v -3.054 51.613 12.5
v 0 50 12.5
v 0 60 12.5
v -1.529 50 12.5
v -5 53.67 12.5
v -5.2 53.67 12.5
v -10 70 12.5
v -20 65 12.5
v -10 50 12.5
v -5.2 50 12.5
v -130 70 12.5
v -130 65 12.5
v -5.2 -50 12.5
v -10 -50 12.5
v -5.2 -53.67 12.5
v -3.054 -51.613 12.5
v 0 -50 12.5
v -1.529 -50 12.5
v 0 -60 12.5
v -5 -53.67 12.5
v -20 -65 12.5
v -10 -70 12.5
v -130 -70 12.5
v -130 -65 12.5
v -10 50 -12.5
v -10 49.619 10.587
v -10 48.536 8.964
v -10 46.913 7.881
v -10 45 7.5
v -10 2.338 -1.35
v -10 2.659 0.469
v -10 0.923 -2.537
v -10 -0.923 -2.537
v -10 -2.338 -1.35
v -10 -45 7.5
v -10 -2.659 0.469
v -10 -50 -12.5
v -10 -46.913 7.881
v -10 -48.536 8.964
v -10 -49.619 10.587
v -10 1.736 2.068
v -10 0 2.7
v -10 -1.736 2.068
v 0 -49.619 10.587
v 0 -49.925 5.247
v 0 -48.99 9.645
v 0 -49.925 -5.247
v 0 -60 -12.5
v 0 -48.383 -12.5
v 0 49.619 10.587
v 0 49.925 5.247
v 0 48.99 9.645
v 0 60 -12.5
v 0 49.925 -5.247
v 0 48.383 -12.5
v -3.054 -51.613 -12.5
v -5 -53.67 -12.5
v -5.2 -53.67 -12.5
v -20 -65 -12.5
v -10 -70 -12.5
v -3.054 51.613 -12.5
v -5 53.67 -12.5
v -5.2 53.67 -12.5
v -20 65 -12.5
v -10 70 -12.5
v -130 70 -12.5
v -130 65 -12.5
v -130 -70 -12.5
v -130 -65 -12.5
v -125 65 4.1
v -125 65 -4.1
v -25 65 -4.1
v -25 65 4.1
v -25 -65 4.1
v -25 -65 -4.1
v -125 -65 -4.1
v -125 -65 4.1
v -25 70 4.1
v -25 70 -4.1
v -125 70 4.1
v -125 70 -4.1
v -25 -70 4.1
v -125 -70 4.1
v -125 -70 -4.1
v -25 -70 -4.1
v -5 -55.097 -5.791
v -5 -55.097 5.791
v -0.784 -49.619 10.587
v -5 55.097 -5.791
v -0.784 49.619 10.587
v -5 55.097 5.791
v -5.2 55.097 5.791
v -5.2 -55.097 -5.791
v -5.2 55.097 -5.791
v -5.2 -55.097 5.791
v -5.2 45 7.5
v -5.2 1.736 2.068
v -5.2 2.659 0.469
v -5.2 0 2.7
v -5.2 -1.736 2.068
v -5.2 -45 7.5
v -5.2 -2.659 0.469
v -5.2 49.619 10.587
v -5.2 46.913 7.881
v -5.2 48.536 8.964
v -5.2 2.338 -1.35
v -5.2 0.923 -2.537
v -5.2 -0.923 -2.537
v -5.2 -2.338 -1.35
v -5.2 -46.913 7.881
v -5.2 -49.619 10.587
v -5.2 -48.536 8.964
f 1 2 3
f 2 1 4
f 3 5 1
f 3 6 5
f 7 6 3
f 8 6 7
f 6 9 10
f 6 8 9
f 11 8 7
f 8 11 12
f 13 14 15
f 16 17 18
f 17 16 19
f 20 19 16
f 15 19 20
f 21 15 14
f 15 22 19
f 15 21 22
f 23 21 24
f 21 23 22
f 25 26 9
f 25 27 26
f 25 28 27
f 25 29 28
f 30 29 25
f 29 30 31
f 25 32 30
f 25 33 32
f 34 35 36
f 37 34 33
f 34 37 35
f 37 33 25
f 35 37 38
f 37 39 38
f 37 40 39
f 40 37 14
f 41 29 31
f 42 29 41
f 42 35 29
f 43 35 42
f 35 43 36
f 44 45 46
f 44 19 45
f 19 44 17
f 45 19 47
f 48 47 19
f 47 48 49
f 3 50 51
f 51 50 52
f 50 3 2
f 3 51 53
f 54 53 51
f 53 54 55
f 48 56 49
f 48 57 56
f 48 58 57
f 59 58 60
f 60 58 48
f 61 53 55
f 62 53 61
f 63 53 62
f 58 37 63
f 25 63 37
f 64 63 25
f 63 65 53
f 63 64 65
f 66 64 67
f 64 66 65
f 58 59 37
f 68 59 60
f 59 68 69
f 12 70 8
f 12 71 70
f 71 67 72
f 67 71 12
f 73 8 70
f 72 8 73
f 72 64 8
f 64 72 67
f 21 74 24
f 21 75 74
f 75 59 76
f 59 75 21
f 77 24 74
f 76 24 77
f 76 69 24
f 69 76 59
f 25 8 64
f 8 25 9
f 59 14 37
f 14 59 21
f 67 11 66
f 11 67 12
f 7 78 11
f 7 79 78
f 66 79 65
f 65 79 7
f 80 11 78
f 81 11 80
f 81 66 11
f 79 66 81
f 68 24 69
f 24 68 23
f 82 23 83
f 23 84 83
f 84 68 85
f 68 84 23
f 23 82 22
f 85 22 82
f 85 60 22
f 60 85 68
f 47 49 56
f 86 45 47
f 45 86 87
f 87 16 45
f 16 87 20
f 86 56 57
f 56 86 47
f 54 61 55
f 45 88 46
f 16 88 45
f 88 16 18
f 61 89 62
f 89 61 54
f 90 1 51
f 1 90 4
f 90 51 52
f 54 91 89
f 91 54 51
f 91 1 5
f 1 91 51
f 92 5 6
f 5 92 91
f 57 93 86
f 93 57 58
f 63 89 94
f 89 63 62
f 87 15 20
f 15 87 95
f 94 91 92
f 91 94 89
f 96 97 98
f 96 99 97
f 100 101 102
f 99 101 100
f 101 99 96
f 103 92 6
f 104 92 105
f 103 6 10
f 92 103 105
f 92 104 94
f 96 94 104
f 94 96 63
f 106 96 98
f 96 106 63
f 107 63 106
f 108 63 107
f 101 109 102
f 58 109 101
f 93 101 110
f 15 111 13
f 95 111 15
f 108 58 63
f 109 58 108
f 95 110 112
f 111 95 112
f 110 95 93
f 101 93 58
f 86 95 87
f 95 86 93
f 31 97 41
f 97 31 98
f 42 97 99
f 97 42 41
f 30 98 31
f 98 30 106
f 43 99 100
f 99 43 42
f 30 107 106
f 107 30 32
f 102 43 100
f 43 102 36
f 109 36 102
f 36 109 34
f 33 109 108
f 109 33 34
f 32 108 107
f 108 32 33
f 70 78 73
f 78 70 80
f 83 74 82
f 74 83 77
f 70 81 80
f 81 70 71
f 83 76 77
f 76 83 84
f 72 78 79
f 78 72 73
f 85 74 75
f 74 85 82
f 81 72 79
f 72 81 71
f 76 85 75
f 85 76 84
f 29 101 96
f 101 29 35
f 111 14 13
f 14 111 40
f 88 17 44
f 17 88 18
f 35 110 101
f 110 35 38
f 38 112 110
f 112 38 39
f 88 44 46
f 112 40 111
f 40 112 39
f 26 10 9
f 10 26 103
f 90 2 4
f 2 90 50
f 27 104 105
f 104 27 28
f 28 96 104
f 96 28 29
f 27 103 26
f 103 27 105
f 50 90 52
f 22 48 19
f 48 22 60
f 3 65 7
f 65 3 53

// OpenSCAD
// file: config_4x5.scad
/*
This is the base configuration file for the 4x5" format
# we are not using the exact ANSI measures, but slightly rounded measures for slight simplification
*/
vStabilizerTotal_h = 7;

// general tolerance
vTolerance = 0.2;

// sheet film and cassette measurements (roughly based on the ANSI measurements)
vFilmSheet_l = 127;
vFilmSheet_w = 102;
vCassette_l = 160; // A min
vCassette_w = 121; // B max
vCassette_h = 13.2; // C max
vLightTrap_l = 2; // M2
vLightTrap_w = vCassette_w;
vLightTrap_h = 1.5; // M1
vLightTrap_offsetX = 141; // G max
vFilmWindow_l = 121;
vFilmWindow_w = 101;
vFilmWindow_offsetX = 16;
vGroundGlass_offsetZ = 5;

// Graflok
vGraflok_h = 6; // this is not the official measurement, just measured from a camera 

// lens board measures (we are using Wista/Technika-style lensboards)
vLensboard_l = 100;
vLensboard_w = 97;
vLensboard_h = 2;
vLensboard_offsetX = -(vLensboard_l+3)/2; // caution: we have an asymetric offset!
vLensboard_offsetY = -vLensboard_w/2;
vLensboardHole_d = 85;
vLensboardLighttrap_d = 89;
vLensboardLighttrap_h = 1+vTolerance;

// bellows frame measures - the bellows frame design is derived from standardcameras.com
// back frame
vBellowsBackInner_l = 144; //???? check and replace with the measurement from your bellows!
vBellowsBackInner_w = vBellowsBackInner_l;
vBellowsBackOuter_l = vBellowsBackInner_l+1;
vBellowsBackOuter_w = vBellowsBackOuter_l;

vBellowsBackFrameOuter_l = 159;
vBellowsBackFrameOuter_w = vBellowsBackFrameOuter_l;
vBellowsBackFrameOuter_h = 7;
vBellowsBackFrameInner_l = 135;
vBellowsBackFrameInner_w = vBellowsBackFrameInner_l;
vBellowsBackFrameInner_h = 5;

vBellowsBackLightTrapOuter_l = vBellowsBackFrameInner_l+2*2;
vBellowsBackLightTrapOuter_w = vBellowsBackLightTrapOuter_l;
vBellowsBackLightTrap_h = 3;

//vBellowsBackFrameScrewHole_d = 2;
//vBellowsBackFrameScrewHole_h = 10;
vBellowsBackFrameScrewHole_offsetXY = 70;
vBellowsBackFrameScrewHole_offsetZ = vBellowsBackFrameOuter_h/2;

// front frame
vBellowsFrontInner_l = 94; //???? check and replace with the measurement from your bellows!
vBellowsFrontInner_w = vBellowsFrontInner_l;
vBellowsFrontOuter_l = vBellowsFrontInner_l+1;
vBellowsFrontOuter_w = vBellowsFrontOuter_l;

vBellowsFrontFrameOuter_l = 104;
vBellowsFrontFrameOuter_w = vBellowsFrontFrameOuter_l;
vBellowsFrontFrameOuter_h = 7;
vBellowsFrontFrameInner_l = 82;
vBellowsFrontFrameInner_w = vBellowsFrontFrameInner_l;
vBellowsFrontFrameInner_h = 5;

vBellowsFrontLightTrapOuter_l = vBellowsFrontFrameInner_l+2*2;
vBellowsFrontLightTrapOuter_w = vBellowsFrontLightTrapOuter_l;
vBellowsFrontLightTrap_h = 0;

//vBellowsFrontFrameScrewHole_d = 2;
//vBellowsFrontFrameScrewHole_h = 10;
vBellowsFrontFrameScrewHole_offsetXY = 40;
vBellowsFrontFrameScrewHole_offsetZ = vBellowsFrontFrameOuter_h/2;

// body dimensions
vWall_strength = 5;
vBodyOuter_l = 185; // make sure this is at least 4*vWall_strength larger than vBellowsBackFrameOuter_l!
vBodyOuter_w = 170; // make sure this is at least 2*vWall_strength larger than vBellowsBackFrameOuter_l!
vBodyOuter_h = 65;
vBodyEdge_r = vWall_strength;

// we will center our model on the Y axis and on the center of the bellows frame
// at least for the 4x5 version, we have to do an asymetric offset of 2.5mm on the X-axis 
vAsymOffsetX = -2.5;  

// back plate
vBackPlateLength = 160; // we will probably use about the same size as the bellows back frame
vBackPlateStrength = vWall_strength;

// hinges for front lid
vHingeInnerDistance = 100;
vHingeBaseWidth = 20;
vHingeHole = 4;

// lid lock measures
vLidLockBase_d = 8;
vLidLockHole_distance = 70;

// rail dimensions
vLowerRail_w = 90;
vUpperRail_w = vLowerRail_w;

// cutout for stop indents
vStopIndent_l = 4;
vStopIndent_h = 5;
vStopIndentDistance = 25; // shorter than 25 is not necessary
vStopIndent_offsetX = 20; // don't go shorter than 20 if you intend to use a 90mm lens!

// for all dovetails we use a base width of 5mm and a base height of 5mm
// we are applying tolerances to the inner AND outer part of a dovetail, in width and height
vDoveTail_w = 5;
vDoveTail_h = 5;
vDoveTail_tolerance = 0.2;

// front standard carrier / slider
// width is depending on vUpperRail_w
vSliderBase_w = vUpperRail_w + (4*vDoveTail_w);
vSliderBase_l = 40; // make sure to have enough space in the body.


// lever plate 
vLeverPlateBase_w = vUpperRail_w - (8*vDoveTail_w);
vLeverPlateBlock_w = 25;
vLeverPlateBlock_l = vSliderBase_l-(2*vDoveTail_w);

vFrontStandard_h = 130;
vFrontStandardSlot_h = vFrontStandard_h - 30;

// lensboard carrier
vFrontPlate_length = vSliderBase_w+6; // vSliderBase_w is a bit too tight for 4x5", so there we will add 5mm, for 5x7 vSliderBase_w is OK to get a squared lensboard carrier
vFrontPlate_width = vSliderBase_w; //vFrontPlate_length;
vFrontPlate_height = 16;
vEdgeCutCylinder = floor(sqrt(2*pow(vFrontPlate_width,2)))-5;

vTiltDovetailBase_d1 = 30;
vTiltDovetailBase_d2 = vTiltDovetailBase_d1+(2*vDoveTail_w);
vTiltDovetailBaseBlock_d = vTiltDovetailBase_d1+(4*vDoveTail_w);

vTiltDovetail_d1 = vTiltDovetailBase_d1-vTolerance;
vTiltDovetail_d2 = vTiltDovetailBase_d2-vTolerance;
vTiltDovetail_h = vDoveTail_w-vTolerance;

vTiltDovetailCutout_d1 = vTiltDovetailBase_d2+vTolerance;
vTiltDovetailCutout_d2 = vTiltDovetailBase_d1+vTolerance;

vAxisHole_d = 10+vTolerance;
vAxisHole_h = vDoveTail_w+vTolerance;

vTiltLockBolt_d = 12;
vTiltLockBolt_h = 14;
//vTiltLockBoltHole_d = 8;
//vTiltLockBoltHole_h = vTiltLockBolt_h;

vTiltHeight = 50;
vTiltRadius = vFrontPlate_length/2;
vTiltAngleMinus = -7;
vTiltAnglePlus = 7;
vTiltAxis_d = 10-vTolerance;

// focusing rod
vFocusingRod_d = 6;
vFocusingKnob_d = 25;
vFocusingKnob_h = 20;

// stabilizer measures (just the outer measures of our stabilizer block, not the tripod slider)
vStabilizerBase_l = 135;
vStabilizerBase_w = 90;  
vStabilizerBase_h = 7;
vStabilizerDovetailBase_w = 50;
// screw holes for the stabilizer
vLidHoleCount_x = 4;
vLidHoleDist_x = 35;
vLidHoleCount_y = 2;
vLidHoleDist_y = 60;


// screw diameters, length is individually set
vScrew1Hole_d = 3;
vScrew1ThreadHole_d = 2.2;
vScrew2Hole_d = 2;
vScrew2ThreadHole_d = 1.4;


// Dimensions for small heat set insert holes.
// Sized for M2 inserts, 3 mm depth, 3.5 mm max OD
// (may be labelled M2x3.5x3)
vInsertM2Hole_d = 3.2;
vInsertM2MinDepth_h = 4.0;
vInsertM2Size_d = 3.5;
vInsertM2Depth_h = 3.0;

// Dimensions for heat set insert holes.
// Sized for "Voron standard" M3 inserts, 4 mm depth, 5 mm max OD
// (variously labelled M3x4x5 or M3x5x4)
vInsertM3Hole_d = 4.7;
vInsertM3MinDepth_h = 5.0;
vInsertM3Size_d = 5.0;
vInsertM3Depth_h = 4.0;

// Dimensions for large heat set insert holes.
// Sized for M5 inserts, 5 mm depth, 7 mm max OD
// (may be labelled M5x7x5)
vInsertM5Hole_d = 6.7;
vInsertM5MinDepth_h = 6.0;
vInsertM5Size_d = 7.0;
vInsertM5Depth_h = 5.0;


// Handle strap
vHandleStrap_h = 2.0;       // Thickness of the strap in mm
vHandleStrap_w = 15.0;      // Width of the strap in mm
vHandleStrap_l = 145.0;     // Total length of the strap in mm
vHandleStrapMovement_l = 35.0;   // Total amount the strap moves, in mm. Each side moves half this amount.
vHandleStrapCutout_w = 4.0;      // Width of the central cutout, in mm
vHandleStrapSlotOffsetFar = vHandleStrap_l/2 - vHandleStrap_w/2;
vHandleStrapSlotOffsetNear = vHandleStrapSlotOffsetFar - vHandleStrapMovement_l/2;
vHandleStrapCoverExtra_l = 5.0;
vHandleStrapHoleSize_d = 3.0;
vStrapHoleDelta = vHandleStrapSlotOffsetNear-vHandleStrapCoverExtra_l+vHandleStrapHoleSize_d/2;
vStrapHoleSpacing = vHandleStrapMovement_l/2 + vHandleStrap_w/2;
// file: modules.scad
/*
This is a collection of the modules which are used heavily within the whole project.
Almost all parts rely on the modules to remain "as is", especially regarding their current orientation.
So please act very carefully here, otherwise you may screw up the complete design!

*/
include <baseconfig.scad>;


// roof module - this is heavily used for dovetail cutouts
// please keep as is
module roof(l, w, h){
    polyhedron(
        points=[
            [0,0,0],
            [l,0,0],
            [l,w,0],
            [0,w,0],
            [0,w/2,h],
            [l,w/2,h]
            ],
        faces=[
            [0,1,2,3],
            [0,4,1],
            [1,4,5,2],
            [2,5,3],
            [3,5,4,0]
            ]
            );
    };

// a wedge module - this is heavily used for cutting edges
// please keep as is    
module wedge(l, w, h) {
    polyhedron(
            points=[
                [0,0,0],
                [l,0,0],
                [l,w,0],
                [0,w,0],
                [0,0,h],
                [l,0,h]
            ],
            faces=[
                [0,3,2,1],
                [0,1,5,4],
                [1,2,5],
                [2,3,4,5],
                [3,0,4]
            ]
    );
   };

// simple tube module.   
module tube(d1, d2, h) {
    difference() {
        cylinder(d=d1, h=h);
        cylinder(d=d2, h=h);
        };
    };

// mainly used for making holes for countersunk screws
// please keep as is    
module countersunk_screw(vScrew_d, vScrew_l){
    union(){
    cylinder(d=vScrew_d, h=vScrew_l);
    cylinder(d1=vScrew_d*2, d2=0, h=vScrew_d);
    };
};

// module for making hexagons, e.g. hex nuts. kw is the key width
// please keep as is
module hex(kw, h) {
	render()
        translate([0, 0, h/2])
            intersection_for(a = [0, 120, 240]) {
                rotate([0, 0, a])
                    cube([kw, 3 * kw, h], true);
                }
}


// Heatset insert
// d: Thread diameter
// od: Outer diameter
// l: Total length
module insert(d, od, l)
{
    echo(Insert = d, od, l);
    difference() {
        cylinder(l, d=od, $fn=15);
        translate([0, 0, -0.5]) cylinder(l+1, d=d, $fn=15);
        };
}

module insert_m2()
{
    color("gold") insert(2, vInsertM2Size_d, vInsertM2Depth_h);
}

module insert_m3()
{
    color("gold") insert(3, vInsertM3Size_d, vInsertM3Depth_h);
}

module insert_m5()
{
    color("gold") insert(5, vInsertM5Size_d, vInsertM5Depth_h);
}

// Countersunk screw, metric, for display
// Example: https://www.aliexpress.com/item/1005007838338973.html
module screw_cs(l, d=3, dk=6, s=2, t=1) {
    // l: total length (including head) in mm
    // d: thread diameter (eg 3 for M3)
    // dk: max head diameter
    // s: hex socket flat-to-flat size
    // t: hex socket depth
    echo(CountersunkScrew = d, l);
    difference() {
        union() {
            cylinder(h=l, r=d/2, $fn=15);
            cylinder(h=(dk-d)/2, r1=dk/2, r2=d/2, $fn=15);
            }
        cylinder(h=t, r=s/2*2/sqrt(3), $fn=6);
    }
}

module screw_m3_cs(l) {
    color("silver") screw_cs(l, d=3, dk=6, s=2, t=1);
}

module screw_m2_cs(l) {
    color("silver") screw_cs(l, d=2, dk=3.8, s=1.5, t=0.75);
}
module screw_m5_cs(l) {
    color("silver") screw_cs(l, d=5, dk=9.5, s=3, t=1.6);
}

// Button head screw, metric, for display
// Example: https://www.aliexpress.com/item/32967225441.html
module screw_bh(l, d=3, k=1.5, dk=5.5, s=2, t=1) {
    // l: shaft length (NOT including head) in mm
    // d: thread diameter (eg 3 for M3)
    // k: head depth
    // dk: head max diameter
    // s: hex socket flat-to-flat size
    // t: hex socket depth
    echo(ButtonheadScrew = d, l);
    difference() {
        union() {
            translate([0, 0, k]) cylinder(h=l, r=d/2, $fn=15);
            difference() {
                translate([0, 0, k]) intersection() {
                    sphere(d=dk, $fn=15);
                    translate([-dk/2, -dk/2, -dk]) cube(dk);
                }
                translate([-dk/2, -dk/2, -dk]) cube(dk);
            }
        }
        cylinder(h=t, r=s/2*2/sqrt(3), $fn=6);
    }
}

module screw_m2_bh(l) {
    color("silver") screw_bh(l, d=2, dk=3.4, s=1.175, t=0.6);
}

module screw_m3_bh(l) {
    color("silver") screw_bh(l, d=3, dk=5.7, s=2, t=1);
}


module nut_m5() {
    echo(Nut = 5);
    difference() {
        rotate([0, 0, 30]) cylinder(h=3.9, d=8*2/sqrt(3), $fn=6);
        cylinder(h=5, d=5, $fn=15);
        }
    }
    
    
module thumbscrew(bolt_d, bolt_dk, screw_d, screw_h, n_knurls, knurl_d, knurl_f) {
    // bolt_d:  central bolt diameter
    // bolt_dk: bolt head max diameter
    // screw_d: thumbscrew outer diameter
    // screw_h: thumbscrew height
    // n_knurls: number of knurls
    
    min_knurl_offset = screw_d/2 - knurl_d;
    max_knurl_offset = screw_d/2 + knurl_d;
    knurl_offset = min_knurl_offset + knurl_f*(max_knurl_offset - min_knurl_offset);
    
    difference()
    {
        union()
        {
            translate([0, 0, 1]) cylinder(screw_h-2, d=screw_d);
            cylinder(1, d1=screw_d-1, d2=screw_d);
            translate([0, 0, screw_h-1]) cylinder(1, d1=screw_d, d2=screw_d-1);
        }
        cylinder(screw_h, d=bolt_d);
        cylinder(bolt_dk/2, d1=bolt_dk, d2=0);
        for (i = [1:n_knurls])
        {
            rotate([0, 0, i*360/(n_knurls)]) translate([knurl_offset, 0, 0]) cylinder(screw_h, d=knurl_d);
        }
    }
}

module thumbscrew_m5(screw_d, screw_h, n_knurls, knurl_d, knurl_f) {
    thumbscrew(5, 9.5, screw_d, screw_h, n_knurls, knurl_d, knurl_f);
}


module t6_flange_coupler() {
    // T6 flange coupler
    // Example: https://www.aliexpress.com/item/1005008049363389.html
    echo(FlangeCoupler = 6);
    difference() {
        union() {
            translate([0, 0, 2]) cylinder(h=10, d=10);
            cylinder(h=2, d=22);
        }
        cylinder(h=12, d=6);
        translate([0, 15, 7]) rotate([90, 0, 0]) cylinder(h=30, d=3);
        for (i = [0:3]) {
            rotate([0, 0, 45+90*i]) translate([-8, 0, 0]) cylinder(h=2, d=3);
        }
    }
}


module AXK0619_thrust_bearing() {
    echo(ThrustBearing = "AXK0619");
    difference() {
        cylinder(h=4, d=19);
        cylinder(h=4, d=6);
    }
}


module t6_lead_screw(l) {
    echo(LeadScrewT6 = l);
    color("silver") cylinder(h=l, d=6);
}

module t6_lead_screw_nut() {
    echo("LeadScrewT6Nut");
    intersection()
    {
        difference() {
            union() {
                cylinder(h=15, d=12);
                translate([0, 0, 1.5]) cylinder(h=3.5, d=24);
            }
            cylinder(h=15, d=6);
        }  
        translate([-50, -12.5/2, -50]) cube([100, 12.5, 100]);
    }
}

module threaded_rod_m5(l) {
    echo(ThreadedRodM5 = l);
    color("silver") cylinder(h=l, d=5);
}

module smooth_rod_m4(l) {
    echo(SmoothRodM4 = l);
    color("silver") cylinder(h=l, d=4);
}


module screw_m3_grub(l) {
    echo(GrubScrew = 3, l);
    color("silver") cylinder(h=l, d=3, $fn=15);
}


module screw_m5_grub(l) {
    echo(GrubScrew = 5, l);
    color("silver") cylinder(h=l, d=5, $fn=15);
}


module washer_m6() {
    // M6x12x0.8 washer
    echo(Washer = 6, 0.8);
    difference() {
        cylinder(h=0.8, d=12);
        cylinder(h=0.8, d=6.6);
    }
}


module springwasher_m6() {
    // M6x12x1.5 washer (compresses to 0.5)
    // Show as compressed (~0.5 mm height)
    echo(SpringWasher = 6);
    difference() {
        cylinder(h=0.5, d=12);
        cylinder(h=0.6, d=6);
    }
}


module chamfer_cylinder(h, d, c=0) {
    if (h >= c) {
        cylinder(h=h-c, d=d);
        translate([0, 0, h-c]) cylinder(h=c, d1=d, d2=d-c);
    } else {
        cylinder(h=h, d=d);
    }
}

module chamfer_cube(w, d, h, c=0) {
    if (h >= c) {
        difference() {
            cube([w, d, h]);
            translate([-c, 0, h]) rotate([0, 45, 0]) cube([sqrt(2)*c, d, sqrt(2)*c]);
            translate([w-c, 0, h]) rotate([0, 45, 0]) cube([sqrt(2)*c, d, sqrt(2)*c]);
            translate([0, 0, h-c]) rotate([45, 0, 0]) cube([w, sqrt(2)*c, sqrt(2)*c]);
            translate([0, d, h-c]) rotate([45, 0, 0]) cube([w, sqrt(2)*c, sqrt(2)*c]);
        }
    } else {
        cube(wdh);
    }
}

module rounded_rect(l, w, h) {
    union()
    {
        translate([-l/2+w/2, 0, 0]) cylinder(h=h, d=w);
        translate([l/2-w/2, 0, 0]) cylinder(h=h, d=w);
        translate([-(l-w)/2, -w/2, 0]) cube([l-w, w, h]);
    }
}
// file: baseconfig.scad
/*
Here we define some variables which are independent from the camera format
*/


// some generic variables

// we are including a format specific configuration sheet - but make sure to include only one!

include <config_4x5.scad>;
// include <config_5x7.scad>;
// include <config_8x10.scad>;

// Arca Swiss tripod plate
// caution: some Arca Swiss compatible tripod heads may have slight variations
// vArca_length = xx; // the length is irrelevant here
vArca_width = 38;
vArca_height = 7;
vArcaBase_cutout = 4;
vArcaBase_height = 1.5;
// main file
// loading the base configuration
include <baseconfig.scad>;

// some modules such as hex, countersunk screws, roof, wedge are available in a module file
use <modules.scad>;

module front_standard() {

// base plate
vFrontStandartBasePlate_d1 = vSliderBase_w; // maybe add tolerance here?
vFrontStandartBasePlate_d2 = vFrontStandartBasePlate_d1-(2*vDoveTail_w);
vFrontStandartBasePlate_length = vSliderBase_l; // we are intersecting our cylinder with a cube!
vFrontStandartBasePlate_width = vFrontStandartBasePlate_d1;
vFrontStandartBasePlate_h1 = vDoveTail_h;
vFrontStandartBasePlate_h2 = vDoveTail_h;
vFrontStandartBasePlate_height = vFrontStandartBasePlate_h1+vFrontStandartBasePlate_h1;
vFrontStandartBasePlate_offsetX = 0;
vFrontStandartBasePlate_offsetY = 0;
vFrontStandartBasePlate_offsetZ = 0;

vCentralScrewHole_d = 5+2*vTolerance;
vCentralScrewHole_h = vFrontStandartBasePlate_height;
vCentralScrewHole_offsetX = 0;
vCentralScrewHole_offsetY = 0;
vCentralScrewHole_offsetZ = 0;

vFrontStandartTiltPlate_length = vSliderBase_l-(3*vDoveTail_w);
vFrontStandartTiltPlate_width = vSliderBase_w+(4*vDoveTail_w);
vFrontStandartTiltPlate_height = 2*vDoveTail_h;

vFrontStandartTiltPlate_offsetX = -vFrontStandartTiltPlate_length/2;
vFrontStandartTiltPlate_offsetY = -vFrontStandartTiltPlate_width/2;
vFrontStandartTiltPlate_offsetZ = 0;

vTiltDoveTail_d1 = vFrontStandartBasePlate_d2+(2*vTolerance);
vTiltDoveTail_d2 = vTiltDoveTail_d1+(2*vDoveTail_w)+(2*vTolerance);
vTiltDovetail_h = vDoveTail_h;

vUprightHolder_length = vFrontStandartTiltPlate_length;
vUprightHolder_width = 15;
vUprightHolder_height = 10;
vUprightHolderLeft_offsetX = vFrontStandartTiltPlate_offsetX;
vUprightHolderLeft_offsetY = -vFrontStandartTiltPlate_offsetY;
vUprightHolderRight_offsetX = -vFrontStandartTiltPlate_offsetX;
vUprightHolderRight_offsetY = vFrontStandartTiltPlate_offsetY;
vUprightHolder_offsetZ = vFrontStandartTiltPlate_height;

vUpright_length = vFrontStandartTiltPlate_length;
vUpright_width = 5;
vUpright_height = vFrontStandard_h;
vUprightSlotCutout_length = 8+vTolerance;
vUprightSlotCutout_width = vFrontStandartTiltPlate_width+(2*vUpright_width);
vUprightSlotCutout_height = vFrontStandardSlot_h;
vUprightLeft_offsetX = vFrontStandartTiltPlate_offsetX;
vUprightRight_offsetX = vFrontStandartTiltPlate_offsetX;
vUprightLeft_offsetY = vFrontStandartTiltPlate_width/2;
vUprightRight_offsetY = -(vFrontStandartTiltPlate_width/2)-vUpright_width;
vUprightSlotCutout_offsetX = -vUprightSlotCutout_length/2;
vUprightSlotCutout_offsetY = -vUprightSlotCutout_width/2;
vUprightSlotCutout_offsetZ = 25;

vPullingLeverCutout_length = vDoveTail_w;
vPullingLeverCutout_width = vUpperRail_w;
vPullingLeverCutout_height = vFrontStandartBasePlate_height;
vPullingLeverCutout_offsetX = -vFrontStandartTiltPlate_offsetX-vPullingLeverCutout_length;
vPullingLeverCutout_offsetY = -vPullingLeverCutout_width/2;
vPullingLeverCutout_offsetZ = 0;

vEdgeCutoff_l = vFrontStandartTiltPlate_length;
vEdgeCutoff_w = 10;
vEdgeCutoff_h = 10; 
vEdgeCutoff_offsetX = vEdgeCutoff_l/2;
vEdgeCutoff_offsetY = -(vFrontStandartTiltPlate_width+10)/2;
vEdgeCutoff_offsetZ = 0;

difference(){
    union(){
        translate([vFrontStandartTiltPlate_offsetX, vFrontStandartTiltPlate_offsetY, vFrontStandartTiltPlate_offsetZ])
            cube([vFrontStandartTiltPlate_length, vFrontStandartTiltPlate_width, vFrontStandartTiltPlate_height]);
        // left upright holder
        translate([-vUprightHolderLeft_offsetX, vUprightHolderLeft_offsetY, vUprightHolder_offsetZ])
            rotate([0, 0, 180])
                wedge(vUprightHolder_length, vUprightHolder_width, vUprightHolder_height);

        // right upright holder
        translate([-vUprightHolderRight_offsetX, vUprightHolderRight_offsetY, vUprightHolder_offsetZ])
            rotate([0, 0, 0])
                wedge(vUprightHolder_length, vUprightHolder_width, vUprightHolder_height);
        // left upright 
        translate([vUprightLeft_offsetX, vUprightLeft_offsetY, 0])
            cube([vUpright_length, vUpright_width, vUpright_height]);
        
        // right upright
        translate([vUprightRight_offsetX, vUprightRight_offsetY, 0])
            cube([vUpright_length, vUpright_width, vUpright_height]);
        };
        
    // cutout for the dovetail itself
    cylinder(d1=vTiltDoveTail_d1, d2=vTiltDoveTail_d2, h=vTiltDovetail_h);
    // a little bit tolerance
    translate([0, 0, vTiltDovetail_h])
        cylinder(d=vTiltDoveTail_d2, h=vTolerance);

    // central screw hole
    cylinder(d=vCentralScrewHole_d, h=vFrontStandartTiltPlate_height);
    
    // cutout for upright slot
    translate([vUprightSlotCutout_offsetX, vUprightSlotCutout_offsetY, vUprightSlotCutout_offsetZ])
        cube([vUprightSlotCutout_length, vUprightSlotCutout_width, vUprightSlotCutout_height]);
       
    // cutout for pulling levers
    translate([vPullingLeverCutout_offsetX, vPullingLeverCutout_offsetY, vPullingLeverCutout_offsetZ])
        cube([vPullingLeverCutout_length, vPullingLeverCutout_width, vPullingLeverCutout_height]); 
    // rounding the cutout edges
    translate([-vFrontStandartTiltPlate_offsetX, vPullingLeverCutout_offsetY, vPullingLeverCutout_offsetZ])
        cylinder(r=vPullingLeverCutout_length, h=vPullingLeverCutout_height);   
    translate([-vFrontStandartTiltPlate_offsetX, -vPullingLeverCutout_offsetY, vPullingLeverCutout_offsetZ])
        cylinder(r=vPullingLeverCutout_length, h=vPullingLeverCutout_height); 
    
    // cut the lower edges
    translate([-vEdgeCutoff_offsetX, vEdgeCutoff_offsetY, vEdgeCutoff_offsetZ])
        rotate([0, 0, 0])
            wedge(vEdgeCutoff_l, vEdgeCutoff_h, vEdgeCutoff_w);
    translate([-vEdgeCutoff_offsetX, -vEdgeCutoff_offsetY, vEdgeCutoff_offsetZ])
        rotate([0, 0, 0])
            wedge(vEdgeCutoff_l, -vEdgeCutoff_h, vEdgeCutoff_w);


};

};

rotate([0, -90, 0]) front_standard();
